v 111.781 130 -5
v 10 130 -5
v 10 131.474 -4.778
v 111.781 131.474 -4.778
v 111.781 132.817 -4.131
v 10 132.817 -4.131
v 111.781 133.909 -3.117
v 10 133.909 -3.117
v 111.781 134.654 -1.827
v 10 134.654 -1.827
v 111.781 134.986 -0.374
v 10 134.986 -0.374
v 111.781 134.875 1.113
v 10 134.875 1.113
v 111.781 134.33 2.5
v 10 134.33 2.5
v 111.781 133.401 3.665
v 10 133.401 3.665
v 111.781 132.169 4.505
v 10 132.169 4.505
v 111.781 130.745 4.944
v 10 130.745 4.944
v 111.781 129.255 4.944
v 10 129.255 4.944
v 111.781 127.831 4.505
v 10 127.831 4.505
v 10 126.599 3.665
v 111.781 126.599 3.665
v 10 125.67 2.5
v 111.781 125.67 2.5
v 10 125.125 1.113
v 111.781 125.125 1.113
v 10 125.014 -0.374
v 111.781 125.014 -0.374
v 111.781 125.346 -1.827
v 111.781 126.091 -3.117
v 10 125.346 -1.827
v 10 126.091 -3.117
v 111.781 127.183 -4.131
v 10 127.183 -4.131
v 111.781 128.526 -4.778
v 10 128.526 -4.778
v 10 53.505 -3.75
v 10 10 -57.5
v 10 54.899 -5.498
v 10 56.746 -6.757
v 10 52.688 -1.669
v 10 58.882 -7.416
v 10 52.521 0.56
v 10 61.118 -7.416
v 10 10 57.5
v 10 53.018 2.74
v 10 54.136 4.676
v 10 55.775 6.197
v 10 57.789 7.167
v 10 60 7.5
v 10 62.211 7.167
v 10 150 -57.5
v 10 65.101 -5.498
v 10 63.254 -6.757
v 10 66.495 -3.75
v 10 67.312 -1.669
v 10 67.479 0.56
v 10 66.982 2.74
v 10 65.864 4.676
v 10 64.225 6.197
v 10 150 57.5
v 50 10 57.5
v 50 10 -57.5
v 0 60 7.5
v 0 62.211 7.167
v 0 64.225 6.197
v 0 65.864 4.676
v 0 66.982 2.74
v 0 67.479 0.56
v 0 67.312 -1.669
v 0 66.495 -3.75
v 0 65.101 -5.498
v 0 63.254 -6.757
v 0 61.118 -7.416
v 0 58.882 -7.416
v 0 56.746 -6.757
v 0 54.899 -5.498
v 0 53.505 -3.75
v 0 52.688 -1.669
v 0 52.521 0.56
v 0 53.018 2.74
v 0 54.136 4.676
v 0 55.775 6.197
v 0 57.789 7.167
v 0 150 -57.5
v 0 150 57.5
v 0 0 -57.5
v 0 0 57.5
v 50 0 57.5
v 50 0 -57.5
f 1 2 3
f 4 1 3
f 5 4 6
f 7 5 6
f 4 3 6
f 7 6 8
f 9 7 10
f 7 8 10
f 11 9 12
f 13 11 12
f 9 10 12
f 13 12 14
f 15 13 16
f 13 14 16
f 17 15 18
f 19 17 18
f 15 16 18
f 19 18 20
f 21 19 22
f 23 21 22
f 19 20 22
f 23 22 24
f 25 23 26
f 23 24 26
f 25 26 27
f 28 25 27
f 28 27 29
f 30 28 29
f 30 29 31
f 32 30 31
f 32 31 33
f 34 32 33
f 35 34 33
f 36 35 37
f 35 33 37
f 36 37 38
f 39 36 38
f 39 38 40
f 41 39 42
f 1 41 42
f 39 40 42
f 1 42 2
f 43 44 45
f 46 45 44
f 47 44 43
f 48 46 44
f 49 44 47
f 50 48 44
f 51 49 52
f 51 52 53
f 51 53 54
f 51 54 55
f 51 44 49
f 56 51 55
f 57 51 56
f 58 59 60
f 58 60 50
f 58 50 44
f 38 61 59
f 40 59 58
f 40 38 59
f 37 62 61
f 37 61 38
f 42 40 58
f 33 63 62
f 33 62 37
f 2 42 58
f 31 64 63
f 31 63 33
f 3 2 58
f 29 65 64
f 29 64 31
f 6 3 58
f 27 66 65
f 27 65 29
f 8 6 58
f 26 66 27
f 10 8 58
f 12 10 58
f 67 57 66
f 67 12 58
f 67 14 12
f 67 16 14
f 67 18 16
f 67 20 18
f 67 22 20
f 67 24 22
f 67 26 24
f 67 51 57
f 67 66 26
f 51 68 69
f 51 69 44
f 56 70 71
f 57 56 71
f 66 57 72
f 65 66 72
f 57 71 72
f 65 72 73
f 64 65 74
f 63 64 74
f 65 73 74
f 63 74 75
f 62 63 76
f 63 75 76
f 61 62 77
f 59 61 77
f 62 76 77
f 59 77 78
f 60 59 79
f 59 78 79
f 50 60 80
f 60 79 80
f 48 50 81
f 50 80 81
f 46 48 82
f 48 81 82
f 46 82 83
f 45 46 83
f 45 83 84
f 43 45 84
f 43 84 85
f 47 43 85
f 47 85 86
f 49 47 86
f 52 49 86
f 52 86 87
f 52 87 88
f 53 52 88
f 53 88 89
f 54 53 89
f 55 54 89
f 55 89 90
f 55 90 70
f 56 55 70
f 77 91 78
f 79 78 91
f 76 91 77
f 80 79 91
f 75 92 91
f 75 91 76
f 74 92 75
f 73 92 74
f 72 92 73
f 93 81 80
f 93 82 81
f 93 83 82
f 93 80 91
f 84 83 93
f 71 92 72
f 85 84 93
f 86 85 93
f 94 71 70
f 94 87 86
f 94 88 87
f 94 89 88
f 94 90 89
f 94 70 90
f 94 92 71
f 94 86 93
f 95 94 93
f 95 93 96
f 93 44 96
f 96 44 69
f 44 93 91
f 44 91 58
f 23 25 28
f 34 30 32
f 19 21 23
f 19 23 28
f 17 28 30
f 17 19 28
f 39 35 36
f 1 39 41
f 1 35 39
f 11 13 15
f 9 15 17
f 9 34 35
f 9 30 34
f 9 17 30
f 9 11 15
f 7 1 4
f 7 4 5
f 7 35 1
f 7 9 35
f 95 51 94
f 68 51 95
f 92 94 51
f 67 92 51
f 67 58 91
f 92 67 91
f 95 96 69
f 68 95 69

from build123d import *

# Parameters (mm, degrees)
BOSS_EXTRUDE1_DEPTH = 57.5
SKETCH2_R           = 7.5
CUT_EXTRUDE1_DEPTH  = 51
SKETCH3_R           = 5
BOSS_EXTRUDE2_DEPTH = 101.780663763


with BuildPart() as part:
    # Sketch1 → Boss-Extrude1 (new body, symmetric)
    with BuildSketch(Plane.XY):
        Polygon((0, 150), (0, 0), (50, 0), (50, 10), (10, 10), (10, 150), align=None)
    extrude(amount=BOSS_EXTRUDE1_DEPTH, both=True)

    # Sketch2 → Cut-Extrude1 (cut, through all)
    with BuildSketch(Plane.ZY):
        with Locations((0, 60)):
            Circle(SKETCH2_R)
    extrude(amount=-CUT_EXTRUDE1_DEPTH, mode=Mode.SUBTRACT)

    # Sketch3 → Boss-Extrude2 (add)
    with BuildSketch(Plane(origin=(10, 0, 0), x_dir=(0, 0, -1), z_dir=(1, 0, 0))):
        with Locations((0, 130)):
            Circle(SKETCH3_R)
    extrude(amount=BOSS_EXTRUDE2_DEPTH)


solid = part.part
